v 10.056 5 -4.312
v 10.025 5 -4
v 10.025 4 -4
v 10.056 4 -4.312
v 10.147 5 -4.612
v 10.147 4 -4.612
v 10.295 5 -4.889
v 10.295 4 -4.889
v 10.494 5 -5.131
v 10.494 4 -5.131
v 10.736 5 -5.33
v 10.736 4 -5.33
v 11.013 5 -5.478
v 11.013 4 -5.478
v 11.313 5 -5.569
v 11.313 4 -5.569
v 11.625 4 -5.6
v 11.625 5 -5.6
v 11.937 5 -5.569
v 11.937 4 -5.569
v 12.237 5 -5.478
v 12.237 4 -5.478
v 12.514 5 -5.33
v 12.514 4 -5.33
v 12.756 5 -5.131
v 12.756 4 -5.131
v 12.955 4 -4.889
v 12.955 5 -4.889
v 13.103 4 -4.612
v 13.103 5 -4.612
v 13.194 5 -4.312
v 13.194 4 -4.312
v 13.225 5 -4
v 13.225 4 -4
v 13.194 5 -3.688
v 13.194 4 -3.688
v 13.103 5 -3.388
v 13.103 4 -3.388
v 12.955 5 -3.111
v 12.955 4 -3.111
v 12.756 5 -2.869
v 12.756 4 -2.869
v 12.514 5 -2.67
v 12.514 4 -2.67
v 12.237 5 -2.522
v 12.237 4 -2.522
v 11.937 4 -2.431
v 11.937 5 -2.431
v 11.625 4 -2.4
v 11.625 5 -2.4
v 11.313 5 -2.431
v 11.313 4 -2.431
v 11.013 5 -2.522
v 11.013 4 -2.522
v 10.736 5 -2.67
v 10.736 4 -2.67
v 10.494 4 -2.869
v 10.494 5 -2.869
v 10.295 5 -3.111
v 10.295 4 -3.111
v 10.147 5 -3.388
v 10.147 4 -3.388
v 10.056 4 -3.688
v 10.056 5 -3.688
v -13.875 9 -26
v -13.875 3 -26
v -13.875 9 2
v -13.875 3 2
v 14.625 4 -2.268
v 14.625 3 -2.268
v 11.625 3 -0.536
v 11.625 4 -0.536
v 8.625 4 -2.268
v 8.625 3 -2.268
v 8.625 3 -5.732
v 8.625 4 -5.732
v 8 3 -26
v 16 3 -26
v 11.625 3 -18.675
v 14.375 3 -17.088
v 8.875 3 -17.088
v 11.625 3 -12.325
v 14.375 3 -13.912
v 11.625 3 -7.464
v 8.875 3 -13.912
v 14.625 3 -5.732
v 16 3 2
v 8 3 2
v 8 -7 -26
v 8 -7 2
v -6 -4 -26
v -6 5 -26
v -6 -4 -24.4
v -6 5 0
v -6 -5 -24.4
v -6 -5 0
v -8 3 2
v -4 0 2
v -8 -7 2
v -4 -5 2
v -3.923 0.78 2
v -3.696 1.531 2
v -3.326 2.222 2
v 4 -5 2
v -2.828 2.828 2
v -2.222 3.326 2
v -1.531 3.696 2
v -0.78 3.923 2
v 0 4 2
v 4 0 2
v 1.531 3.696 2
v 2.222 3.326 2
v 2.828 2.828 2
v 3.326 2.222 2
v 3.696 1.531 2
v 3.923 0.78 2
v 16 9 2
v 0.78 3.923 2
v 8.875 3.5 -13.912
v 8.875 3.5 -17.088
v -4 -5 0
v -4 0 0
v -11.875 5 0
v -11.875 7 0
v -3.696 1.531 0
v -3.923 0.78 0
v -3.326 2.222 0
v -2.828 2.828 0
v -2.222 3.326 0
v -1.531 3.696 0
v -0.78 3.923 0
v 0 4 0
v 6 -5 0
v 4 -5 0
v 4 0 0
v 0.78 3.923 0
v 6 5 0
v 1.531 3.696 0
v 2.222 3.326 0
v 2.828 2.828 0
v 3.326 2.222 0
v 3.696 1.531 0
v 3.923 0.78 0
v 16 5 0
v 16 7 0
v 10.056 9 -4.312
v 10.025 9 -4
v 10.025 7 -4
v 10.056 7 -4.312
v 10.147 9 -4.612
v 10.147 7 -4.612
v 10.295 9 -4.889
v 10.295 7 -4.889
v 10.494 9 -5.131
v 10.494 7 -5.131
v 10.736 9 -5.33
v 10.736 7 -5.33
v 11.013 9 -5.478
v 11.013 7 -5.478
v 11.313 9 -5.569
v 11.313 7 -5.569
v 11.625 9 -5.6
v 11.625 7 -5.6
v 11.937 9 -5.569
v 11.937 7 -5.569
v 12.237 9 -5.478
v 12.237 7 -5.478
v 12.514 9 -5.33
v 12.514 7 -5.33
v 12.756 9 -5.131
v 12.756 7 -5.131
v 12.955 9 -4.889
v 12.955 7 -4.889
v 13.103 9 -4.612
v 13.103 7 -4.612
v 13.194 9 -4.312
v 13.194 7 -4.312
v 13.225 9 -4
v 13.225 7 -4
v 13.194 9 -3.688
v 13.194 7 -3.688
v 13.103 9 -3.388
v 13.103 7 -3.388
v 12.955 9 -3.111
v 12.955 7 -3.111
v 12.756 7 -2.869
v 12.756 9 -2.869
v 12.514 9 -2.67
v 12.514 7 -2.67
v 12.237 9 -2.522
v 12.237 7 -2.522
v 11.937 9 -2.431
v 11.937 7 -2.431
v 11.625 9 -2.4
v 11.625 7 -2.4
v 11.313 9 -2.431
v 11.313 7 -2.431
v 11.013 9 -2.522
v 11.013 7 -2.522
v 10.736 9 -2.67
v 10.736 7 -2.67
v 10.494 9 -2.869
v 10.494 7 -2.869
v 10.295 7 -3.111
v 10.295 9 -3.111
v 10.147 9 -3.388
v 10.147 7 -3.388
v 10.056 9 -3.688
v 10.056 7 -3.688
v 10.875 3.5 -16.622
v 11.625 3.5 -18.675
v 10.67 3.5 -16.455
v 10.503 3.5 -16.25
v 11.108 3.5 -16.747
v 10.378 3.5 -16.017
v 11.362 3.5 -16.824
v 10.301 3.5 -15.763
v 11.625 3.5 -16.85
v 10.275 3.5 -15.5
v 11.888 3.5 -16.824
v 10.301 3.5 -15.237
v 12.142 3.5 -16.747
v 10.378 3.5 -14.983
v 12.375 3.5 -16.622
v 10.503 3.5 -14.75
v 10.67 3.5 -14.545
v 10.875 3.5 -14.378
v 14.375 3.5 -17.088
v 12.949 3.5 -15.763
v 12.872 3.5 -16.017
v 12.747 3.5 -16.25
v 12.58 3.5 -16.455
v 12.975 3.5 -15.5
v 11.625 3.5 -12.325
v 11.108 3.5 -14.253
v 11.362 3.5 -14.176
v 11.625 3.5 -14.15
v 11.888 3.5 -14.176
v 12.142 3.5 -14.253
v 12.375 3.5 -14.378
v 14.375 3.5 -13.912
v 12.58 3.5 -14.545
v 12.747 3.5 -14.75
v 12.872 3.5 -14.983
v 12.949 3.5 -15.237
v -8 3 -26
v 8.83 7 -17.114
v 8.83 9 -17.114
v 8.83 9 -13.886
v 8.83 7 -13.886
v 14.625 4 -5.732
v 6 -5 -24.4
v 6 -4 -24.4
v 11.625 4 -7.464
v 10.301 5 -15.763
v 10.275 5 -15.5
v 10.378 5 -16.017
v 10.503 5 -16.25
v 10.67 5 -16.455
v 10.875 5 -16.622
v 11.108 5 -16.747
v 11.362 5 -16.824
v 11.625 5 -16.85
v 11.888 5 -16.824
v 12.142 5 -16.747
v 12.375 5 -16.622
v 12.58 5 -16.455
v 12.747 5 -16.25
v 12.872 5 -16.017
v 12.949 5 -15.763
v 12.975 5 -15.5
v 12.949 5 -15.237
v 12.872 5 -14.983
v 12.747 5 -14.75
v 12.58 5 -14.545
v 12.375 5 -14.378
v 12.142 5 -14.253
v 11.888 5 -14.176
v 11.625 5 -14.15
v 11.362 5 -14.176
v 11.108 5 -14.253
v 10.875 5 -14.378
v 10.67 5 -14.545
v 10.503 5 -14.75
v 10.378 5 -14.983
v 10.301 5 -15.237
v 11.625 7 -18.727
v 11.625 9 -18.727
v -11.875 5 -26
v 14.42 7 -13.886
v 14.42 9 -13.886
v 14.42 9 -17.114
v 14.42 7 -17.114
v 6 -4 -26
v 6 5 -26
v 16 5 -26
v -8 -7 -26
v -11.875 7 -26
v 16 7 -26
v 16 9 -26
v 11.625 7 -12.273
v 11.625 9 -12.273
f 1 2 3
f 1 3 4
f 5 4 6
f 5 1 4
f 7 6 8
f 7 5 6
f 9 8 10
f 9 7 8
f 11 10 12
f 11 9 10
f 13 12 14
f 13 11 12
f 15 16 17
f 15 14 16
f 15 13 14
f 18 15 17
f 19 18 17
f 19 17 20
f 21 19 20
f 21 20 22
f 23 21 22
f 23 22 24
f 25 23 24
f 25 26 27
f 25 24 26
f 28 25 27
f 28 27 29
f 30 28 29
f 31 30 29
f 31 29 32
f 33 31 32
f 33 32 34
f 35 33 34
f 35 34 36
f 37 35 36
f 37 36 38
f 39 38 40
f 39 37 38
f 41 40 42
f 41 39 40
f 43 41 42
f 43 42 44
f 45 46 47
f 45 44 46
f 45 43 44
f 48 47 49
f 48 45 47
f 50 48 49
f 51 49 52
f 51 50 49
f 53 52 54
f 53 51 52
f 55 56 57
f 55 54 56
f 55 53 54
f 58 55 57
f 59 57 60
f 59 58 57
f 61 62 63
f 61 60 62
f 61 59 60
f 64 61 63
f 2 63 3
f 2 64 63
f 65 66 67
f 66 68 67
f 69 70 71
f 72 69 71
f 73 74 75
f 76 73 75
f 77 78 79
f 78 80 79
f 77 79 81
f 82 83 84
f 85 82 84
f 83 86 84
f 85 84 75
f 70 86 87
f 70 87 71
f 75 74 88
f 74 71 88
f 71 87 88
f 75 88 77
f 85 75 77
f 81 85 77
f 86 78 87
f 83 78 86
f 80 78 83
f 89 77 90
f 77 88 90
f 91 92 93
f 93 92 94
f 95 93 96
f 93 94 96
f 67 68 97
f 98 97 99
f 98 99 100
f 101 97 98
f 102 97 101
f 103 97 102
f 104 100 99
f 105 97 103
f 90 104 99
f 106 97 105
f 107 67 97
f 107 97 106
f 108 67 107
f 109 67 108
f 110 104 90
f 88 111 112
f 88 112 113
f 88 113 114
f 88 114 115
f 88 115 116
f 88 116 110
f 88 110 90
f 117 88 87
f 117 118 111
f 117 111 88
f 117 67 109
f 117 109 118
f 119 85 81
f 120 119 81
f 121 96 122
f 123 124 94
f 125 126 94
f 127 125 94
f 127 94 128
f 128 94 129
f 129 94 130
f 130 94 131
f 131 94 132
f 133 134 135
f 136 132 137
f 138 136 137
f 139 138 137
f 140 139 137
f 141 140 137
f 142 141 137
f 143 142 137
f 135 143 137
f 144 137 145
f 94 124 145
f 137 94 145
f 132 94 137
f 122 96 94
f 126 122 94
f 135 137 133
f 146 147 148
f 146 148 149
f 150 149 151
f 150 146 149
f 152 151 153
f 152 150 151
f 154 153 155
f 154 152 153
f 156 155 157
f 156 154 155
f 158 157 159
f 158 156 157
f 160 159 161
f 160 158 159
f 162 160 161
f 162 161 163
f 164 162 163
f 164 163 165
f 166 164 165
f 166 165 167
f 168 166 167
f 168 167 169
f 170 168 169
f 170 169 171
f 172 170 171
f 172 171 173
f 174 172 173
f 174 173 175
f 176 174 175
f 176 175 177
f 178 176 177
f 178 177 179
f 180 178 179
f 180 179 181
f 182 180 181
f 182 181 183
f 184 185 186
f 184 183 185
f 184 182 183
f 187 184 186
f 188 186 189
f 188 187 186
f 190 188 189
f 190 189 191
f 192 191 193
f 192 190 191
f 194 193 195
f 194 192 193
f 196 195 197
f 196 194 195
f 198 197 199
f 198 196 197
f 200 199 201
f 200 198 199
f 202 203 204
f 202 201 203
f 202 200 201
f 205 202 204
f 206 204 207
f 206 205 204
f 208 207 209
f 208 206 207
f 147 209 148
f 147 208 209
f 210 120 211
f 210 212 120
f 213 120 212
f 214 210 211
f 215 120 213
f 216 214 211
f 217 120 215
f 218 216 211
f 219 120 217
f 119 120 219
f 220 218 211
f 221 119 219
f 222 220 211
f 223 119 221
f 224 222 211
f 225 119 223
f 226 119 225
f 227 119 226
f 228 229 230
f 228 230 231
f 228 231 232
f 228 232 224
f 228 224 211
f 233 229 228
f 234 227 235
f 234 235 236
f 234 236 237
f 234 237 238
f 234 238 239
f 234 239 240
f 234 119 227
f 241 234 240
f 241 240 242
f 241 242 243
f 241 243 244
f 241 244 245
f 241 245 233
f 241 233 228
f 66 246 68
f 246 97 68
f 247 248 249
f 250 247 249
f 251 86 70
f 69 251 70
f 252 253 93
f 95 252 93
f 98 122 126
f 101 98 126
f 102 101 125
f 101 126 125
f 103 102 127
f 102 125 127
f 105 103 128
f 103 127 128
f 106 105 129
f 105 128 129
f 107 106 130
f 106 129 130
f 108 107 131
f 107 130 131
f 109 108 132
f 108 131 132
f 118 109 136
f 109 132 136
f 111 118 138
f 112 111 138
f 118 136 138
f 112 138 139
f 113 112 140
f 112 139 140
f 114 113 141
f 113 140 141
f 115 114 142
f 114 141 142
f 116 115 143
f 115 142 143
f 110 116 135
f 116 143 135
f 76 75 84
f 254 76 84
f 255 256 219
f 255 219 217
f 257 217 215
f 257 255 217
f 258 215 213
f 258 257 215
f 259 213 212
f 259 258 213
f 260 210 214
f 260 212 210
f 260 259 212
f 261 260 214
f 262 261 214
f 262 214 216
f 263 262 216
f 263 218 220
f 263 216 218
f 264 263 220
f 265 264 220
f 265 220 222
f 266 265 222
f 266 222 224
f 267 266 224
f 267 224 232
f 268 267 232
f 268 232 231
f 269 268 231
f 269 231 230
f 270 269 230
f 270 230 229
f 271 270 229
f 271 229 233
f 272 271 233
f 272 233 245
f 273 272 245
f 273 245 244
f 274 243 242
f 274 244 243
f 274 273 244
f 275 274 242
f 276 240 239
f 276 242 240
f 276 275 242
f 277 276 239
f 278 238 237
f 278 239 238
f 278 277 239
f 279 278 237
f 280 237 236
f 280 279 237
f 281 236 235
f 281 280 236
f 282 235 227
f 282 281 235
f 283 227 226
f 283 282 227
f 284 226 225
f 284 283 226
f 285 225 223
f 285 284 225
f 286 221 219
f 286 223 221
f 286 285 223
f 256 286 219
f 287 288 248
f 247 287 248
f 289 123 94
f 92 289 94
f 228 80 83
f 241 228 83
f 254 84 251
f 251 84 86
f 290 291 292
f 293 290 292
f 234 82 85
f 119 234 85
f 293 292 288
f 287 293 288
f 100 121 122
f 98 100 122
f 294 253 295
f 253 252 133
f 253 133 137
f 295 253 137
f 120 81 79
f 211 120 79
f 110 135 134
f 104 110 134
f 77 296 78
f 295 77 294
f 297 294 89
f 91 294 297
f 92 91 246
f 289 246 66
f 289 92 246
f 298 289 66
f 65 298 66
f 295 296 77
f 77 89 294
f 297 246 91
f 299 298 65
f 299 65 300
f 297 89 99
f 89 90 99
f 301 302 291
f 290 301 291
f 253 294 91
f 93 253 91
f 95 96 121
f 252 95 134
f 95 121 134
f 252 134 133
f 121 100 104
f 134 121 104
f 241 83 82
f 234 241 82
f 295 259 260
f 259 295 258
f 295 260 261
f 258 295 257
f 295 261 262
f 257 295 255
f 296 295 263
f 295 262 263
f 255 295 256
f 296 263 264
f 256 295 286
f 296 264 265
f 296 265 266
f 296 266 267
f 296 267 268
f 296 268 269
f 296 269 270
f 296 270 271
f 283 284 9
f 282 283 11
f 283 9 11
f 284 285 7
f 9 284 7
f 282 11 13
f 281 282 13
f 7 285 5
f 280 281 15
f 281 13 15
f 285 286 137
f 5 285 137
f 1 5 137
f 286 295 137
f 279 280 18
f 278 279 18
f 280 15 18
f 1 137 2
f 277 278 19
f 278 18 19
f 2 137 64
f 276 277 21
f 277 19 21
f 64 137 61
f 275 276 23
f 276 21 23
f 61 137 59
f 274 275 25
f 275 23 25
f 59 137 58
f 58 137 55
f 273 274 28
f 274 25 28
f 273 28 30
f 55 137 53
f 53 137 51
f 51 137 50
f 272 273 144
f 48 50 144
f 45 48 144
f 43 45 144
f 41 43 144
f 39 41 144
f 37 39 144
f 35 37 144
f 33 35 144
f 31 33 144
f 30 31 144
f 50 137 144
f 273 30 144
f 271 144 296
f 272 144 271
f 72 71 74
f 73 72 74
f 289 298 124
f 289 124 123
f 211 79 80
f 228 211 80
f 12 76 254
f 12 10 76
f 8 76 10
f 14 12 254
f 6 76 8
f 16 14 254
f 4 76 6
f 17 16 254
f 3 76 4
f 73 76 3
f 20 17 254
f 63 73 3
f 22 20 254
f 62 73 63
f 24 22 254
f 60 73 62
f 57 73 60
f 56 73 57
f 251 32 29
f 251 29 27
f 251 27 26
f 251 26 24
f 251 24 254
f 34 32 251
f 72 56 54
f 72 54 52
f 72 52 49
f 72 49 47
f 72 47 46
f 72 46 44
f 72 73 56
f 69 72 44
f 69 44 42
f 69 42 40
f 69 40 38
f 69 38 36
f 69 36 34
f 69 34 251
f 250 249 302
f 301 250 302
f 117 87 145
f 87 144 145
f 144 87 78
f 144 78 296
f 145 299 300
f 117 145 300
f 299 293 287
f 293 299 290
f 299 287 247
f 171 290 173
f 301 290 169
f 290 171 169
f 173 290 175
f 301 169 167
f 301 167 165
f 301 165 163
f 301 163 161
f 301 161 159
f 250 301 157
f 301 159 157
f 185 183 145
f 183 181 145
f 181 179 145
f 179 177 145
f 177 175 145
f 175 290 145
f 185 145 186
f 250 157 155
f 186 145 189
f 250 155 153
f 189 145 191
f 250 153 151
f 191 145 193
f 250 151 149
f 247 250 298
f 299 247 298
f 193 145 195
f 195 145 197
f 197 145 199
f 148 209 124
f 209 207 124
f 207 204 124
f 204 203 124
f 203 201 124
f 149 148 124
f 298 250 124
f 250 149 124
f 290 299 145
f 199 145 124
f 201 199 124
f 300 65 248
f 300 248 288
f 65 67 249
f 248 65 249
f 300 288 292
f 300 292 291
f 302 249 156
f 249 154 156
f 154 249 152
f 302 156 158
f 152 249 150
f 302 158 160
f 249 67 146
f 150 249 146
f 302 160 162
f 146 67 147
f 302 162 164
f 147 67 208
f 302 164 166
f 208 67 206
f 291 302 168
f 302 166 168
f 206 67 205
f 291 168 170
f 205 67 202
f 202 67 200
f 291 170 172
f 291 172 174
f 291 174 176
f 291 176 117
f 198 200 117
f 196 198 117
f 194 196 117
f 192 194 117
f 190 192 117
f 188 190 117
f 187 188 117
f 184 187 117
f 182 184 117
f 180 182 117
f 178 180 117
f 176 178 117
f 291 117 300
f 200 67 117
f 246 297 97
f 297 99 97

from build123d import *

# Parameters (mm, degrees)
EXTRUDE_1_DEPTH          = 2
EXTRUDE_2_DEPTH          = 26
SKETCH_3_W               = 12
SKETCH_3_H               = 1
EXTRUDE_3_DEPTH          = 1.6
CUT_EXTRUDE_1_DEPTH      = 2
CUT_EXTRUDE_2_DEPTH      = 0.5
CUT_EXTRUDE_3_DEPTH      = 1
CUT_EXTRUDE_4_DEPTH      = 1
CUT_EXTRUDE_4_DEPTH_BACK = 33.449961479
SKETCH_7_R               = 1.35
SKETCH_7_R_2             = 1.6


with BuildPart() as part:
    # 草图1 → 凸台-拉伸1 (new body)
    with BuildSketch(Plane.XY):
        with BuildLine():
            Line((8, -7), (8, 3))
            Line((8, 3), (16, 3))
            Line((16, 3), (16, 5))
            Line((16, 5), (8, 5))
            Line((8, 5), (5, 5))
            ThreePointArc((5, 5), (5.707106781, 4.707106781), (6, 4))
            Line((6, 4), (6, -4))
            ThreePointArc((6, -4), (5.707106781, -4.707106781), (5, -5))
            Line((5, -5), (4, -5))
            Line((4, -5), (-4, -5))
            Line((-4, -5), (-5, -5))
            ThreePointArc((-5, -5), (-5.707106781, -4.707106781), (-6, -4))
            Line((-6, -4), (-6, 4))
            ThreePointArc((-6, 4), (-5.707106781, 4.707106781), (-5, 5))
            Line((-5, 5), (-8, 5))
            Line((-8, 5), (-11.875, 5))
            Line((-11.875, 5), (-11.875, 7))
            Line((-11.875, 7), (16, 7))
            Line((16, 7), (16, 9))
            Line((16, 9), (-13.875, 9))
            Line((-13.875, 9), (-13.875, 3))
            Line((-13.875, 3), (-8, 3))
            Line((-8, 3), (-8, -7))
            Line((-8, -7), (8, -7))
        make_face()
        Polygon((8, 5), (16, 5), (16, 7), (-11.875, 7), (-11.875, 5), (-8, 5), (-5, 5), (5, 5), align=None)
        with BuildLine():
            ThreePointArc((6, 4), (5.707106781, 4.707106781), (5, 5))
            Line((5, 5), (-5, 5))
            ThreePointArc((-5, 5), (-5.707106781, 4.707106781), (-6, 4))
            Line((-6, 4), (-6, -4))
            ThreePointArc((-6, -4), (-5.707106781, -4.707106781), (-5, -5))
            Line((-5, -5), (-4, -5))
            Line((-4, -5), (-4, 0))
            ThreePointArc((-4, 0), (0, 4), (4, 0))
            Line((4, 0), (4, -5))
            Line((4, -5), (5, -5))
            ThreePointArc((5, -5), (5.707106781, -4.707106781), (6, -4))
            Line((6, -4), (6, 4))
        make_face()
    extrude(amount=EXTRUDE_1_DEPTH)

    # 草图2 → 凸台-拉伸2 (add)
    with BuildSketch(Plane(origin=(0, 0, 0), x_dir=(-1, 0, 0), z_dir=(0, 0, -1))):
        Polygon((6, -4), (6, -5), (5, -5), (-5, -5), (-6, -5), (-6, -4), (-6, 4), (-6, 5), (-16, 5), (-16, 3), (-8, 3), (-8, -7), (8, -7), (8, 3), (13.875, 3), (13.875, 9), (-16, 9), (-16, 7), (11.875, 7), (11.875, 5), (6, 5), (6, 4), align=None)
    extrude(amount=EXTRUDE_2_DEPTH)

    # 草图3 → 凸台-拉伸3 (add)
    with BuildSketch(Plane(origin=(0, 0, -26), x_dir=(-1, 0, 0), z_dir=(0, 0, -1))):
        with Locations((0, -4.5)):
            Rectangle(SKETCH_3_W, SKETCH_3_H)
    extrude(amount=-EXTRUDE_3_DEPTH)

    # 草图4 → 切除-拉伸1 (cut)
    with BuildSketch(Plane(origin=(0, 9, 0), x_dir=(1, 0, 0), z_dir=(0, 1, 0))):
        Polygon((11.625, 12.272649731), (14.41996732, 13.886324865), (14.41996732, 17.113675135), (11.625, 18.727350269), (8.83003268, 17.113675135), (8.83003268, 13.886324865), align=None)
    extrude(amount=-CUT_EXTRUDE_1_DEPTH, mode=Mode.SUBTRACT)

    # 草图5 → 切除-拉伸2 (cut)
    with BuildSketch(Plane.XZ.offset(-3)):
        Polygon((11.625, -18.675426481), (14.375, -17.08771324), (14.375, -13.91228676), (11.625, -12.324573519), (8.875, -13.91228676), (8.875, -17.08771324), align=None)
    extrude(amount=-CUT_EXTRUDE_2_DEPTH, mode=Mode.SUBTRACT)

    # 草图6 → 切除-拉伸3 (cut)
    with BuildSketch(Plane.XZ.offset(-3)):
        Polygon((8.625, -5.732050808), (11.625, -7.464101615), (14.625, -5.732050808), (14.625, -2.267949192), (11.625, -0.535898385), (8.625, -2.267949192), align=None)
    extrude(amount=-CUT_EXTRUDE_3_DEPTH, mode=Mode.SUBTRACT)

    # 草图7 → 切除-拉伸4 (cut, two sides: drawn at the far end of the back side and taken through both)
    with BuildSketch(Plane.XZ.offset(-4).offset(-CUT_EXTRUDE_4_DEPTH_BACK)):
        with Locations(Location((11.625, -15.5, 0), (0, 0, 180))):
            Circle(SKETCH_7_R)
        with Locations(Location((11.625, -4, 0), (0, 0, 180))):
            Circle(SKETCH_7_R_2)
    extrude(amount=CUT_EXTRUDE_4_DEPTH + CUT_EXTRUDE_4_DEPTH_BACK, mode=Mode.SUBTRACT)


solid = part.part
